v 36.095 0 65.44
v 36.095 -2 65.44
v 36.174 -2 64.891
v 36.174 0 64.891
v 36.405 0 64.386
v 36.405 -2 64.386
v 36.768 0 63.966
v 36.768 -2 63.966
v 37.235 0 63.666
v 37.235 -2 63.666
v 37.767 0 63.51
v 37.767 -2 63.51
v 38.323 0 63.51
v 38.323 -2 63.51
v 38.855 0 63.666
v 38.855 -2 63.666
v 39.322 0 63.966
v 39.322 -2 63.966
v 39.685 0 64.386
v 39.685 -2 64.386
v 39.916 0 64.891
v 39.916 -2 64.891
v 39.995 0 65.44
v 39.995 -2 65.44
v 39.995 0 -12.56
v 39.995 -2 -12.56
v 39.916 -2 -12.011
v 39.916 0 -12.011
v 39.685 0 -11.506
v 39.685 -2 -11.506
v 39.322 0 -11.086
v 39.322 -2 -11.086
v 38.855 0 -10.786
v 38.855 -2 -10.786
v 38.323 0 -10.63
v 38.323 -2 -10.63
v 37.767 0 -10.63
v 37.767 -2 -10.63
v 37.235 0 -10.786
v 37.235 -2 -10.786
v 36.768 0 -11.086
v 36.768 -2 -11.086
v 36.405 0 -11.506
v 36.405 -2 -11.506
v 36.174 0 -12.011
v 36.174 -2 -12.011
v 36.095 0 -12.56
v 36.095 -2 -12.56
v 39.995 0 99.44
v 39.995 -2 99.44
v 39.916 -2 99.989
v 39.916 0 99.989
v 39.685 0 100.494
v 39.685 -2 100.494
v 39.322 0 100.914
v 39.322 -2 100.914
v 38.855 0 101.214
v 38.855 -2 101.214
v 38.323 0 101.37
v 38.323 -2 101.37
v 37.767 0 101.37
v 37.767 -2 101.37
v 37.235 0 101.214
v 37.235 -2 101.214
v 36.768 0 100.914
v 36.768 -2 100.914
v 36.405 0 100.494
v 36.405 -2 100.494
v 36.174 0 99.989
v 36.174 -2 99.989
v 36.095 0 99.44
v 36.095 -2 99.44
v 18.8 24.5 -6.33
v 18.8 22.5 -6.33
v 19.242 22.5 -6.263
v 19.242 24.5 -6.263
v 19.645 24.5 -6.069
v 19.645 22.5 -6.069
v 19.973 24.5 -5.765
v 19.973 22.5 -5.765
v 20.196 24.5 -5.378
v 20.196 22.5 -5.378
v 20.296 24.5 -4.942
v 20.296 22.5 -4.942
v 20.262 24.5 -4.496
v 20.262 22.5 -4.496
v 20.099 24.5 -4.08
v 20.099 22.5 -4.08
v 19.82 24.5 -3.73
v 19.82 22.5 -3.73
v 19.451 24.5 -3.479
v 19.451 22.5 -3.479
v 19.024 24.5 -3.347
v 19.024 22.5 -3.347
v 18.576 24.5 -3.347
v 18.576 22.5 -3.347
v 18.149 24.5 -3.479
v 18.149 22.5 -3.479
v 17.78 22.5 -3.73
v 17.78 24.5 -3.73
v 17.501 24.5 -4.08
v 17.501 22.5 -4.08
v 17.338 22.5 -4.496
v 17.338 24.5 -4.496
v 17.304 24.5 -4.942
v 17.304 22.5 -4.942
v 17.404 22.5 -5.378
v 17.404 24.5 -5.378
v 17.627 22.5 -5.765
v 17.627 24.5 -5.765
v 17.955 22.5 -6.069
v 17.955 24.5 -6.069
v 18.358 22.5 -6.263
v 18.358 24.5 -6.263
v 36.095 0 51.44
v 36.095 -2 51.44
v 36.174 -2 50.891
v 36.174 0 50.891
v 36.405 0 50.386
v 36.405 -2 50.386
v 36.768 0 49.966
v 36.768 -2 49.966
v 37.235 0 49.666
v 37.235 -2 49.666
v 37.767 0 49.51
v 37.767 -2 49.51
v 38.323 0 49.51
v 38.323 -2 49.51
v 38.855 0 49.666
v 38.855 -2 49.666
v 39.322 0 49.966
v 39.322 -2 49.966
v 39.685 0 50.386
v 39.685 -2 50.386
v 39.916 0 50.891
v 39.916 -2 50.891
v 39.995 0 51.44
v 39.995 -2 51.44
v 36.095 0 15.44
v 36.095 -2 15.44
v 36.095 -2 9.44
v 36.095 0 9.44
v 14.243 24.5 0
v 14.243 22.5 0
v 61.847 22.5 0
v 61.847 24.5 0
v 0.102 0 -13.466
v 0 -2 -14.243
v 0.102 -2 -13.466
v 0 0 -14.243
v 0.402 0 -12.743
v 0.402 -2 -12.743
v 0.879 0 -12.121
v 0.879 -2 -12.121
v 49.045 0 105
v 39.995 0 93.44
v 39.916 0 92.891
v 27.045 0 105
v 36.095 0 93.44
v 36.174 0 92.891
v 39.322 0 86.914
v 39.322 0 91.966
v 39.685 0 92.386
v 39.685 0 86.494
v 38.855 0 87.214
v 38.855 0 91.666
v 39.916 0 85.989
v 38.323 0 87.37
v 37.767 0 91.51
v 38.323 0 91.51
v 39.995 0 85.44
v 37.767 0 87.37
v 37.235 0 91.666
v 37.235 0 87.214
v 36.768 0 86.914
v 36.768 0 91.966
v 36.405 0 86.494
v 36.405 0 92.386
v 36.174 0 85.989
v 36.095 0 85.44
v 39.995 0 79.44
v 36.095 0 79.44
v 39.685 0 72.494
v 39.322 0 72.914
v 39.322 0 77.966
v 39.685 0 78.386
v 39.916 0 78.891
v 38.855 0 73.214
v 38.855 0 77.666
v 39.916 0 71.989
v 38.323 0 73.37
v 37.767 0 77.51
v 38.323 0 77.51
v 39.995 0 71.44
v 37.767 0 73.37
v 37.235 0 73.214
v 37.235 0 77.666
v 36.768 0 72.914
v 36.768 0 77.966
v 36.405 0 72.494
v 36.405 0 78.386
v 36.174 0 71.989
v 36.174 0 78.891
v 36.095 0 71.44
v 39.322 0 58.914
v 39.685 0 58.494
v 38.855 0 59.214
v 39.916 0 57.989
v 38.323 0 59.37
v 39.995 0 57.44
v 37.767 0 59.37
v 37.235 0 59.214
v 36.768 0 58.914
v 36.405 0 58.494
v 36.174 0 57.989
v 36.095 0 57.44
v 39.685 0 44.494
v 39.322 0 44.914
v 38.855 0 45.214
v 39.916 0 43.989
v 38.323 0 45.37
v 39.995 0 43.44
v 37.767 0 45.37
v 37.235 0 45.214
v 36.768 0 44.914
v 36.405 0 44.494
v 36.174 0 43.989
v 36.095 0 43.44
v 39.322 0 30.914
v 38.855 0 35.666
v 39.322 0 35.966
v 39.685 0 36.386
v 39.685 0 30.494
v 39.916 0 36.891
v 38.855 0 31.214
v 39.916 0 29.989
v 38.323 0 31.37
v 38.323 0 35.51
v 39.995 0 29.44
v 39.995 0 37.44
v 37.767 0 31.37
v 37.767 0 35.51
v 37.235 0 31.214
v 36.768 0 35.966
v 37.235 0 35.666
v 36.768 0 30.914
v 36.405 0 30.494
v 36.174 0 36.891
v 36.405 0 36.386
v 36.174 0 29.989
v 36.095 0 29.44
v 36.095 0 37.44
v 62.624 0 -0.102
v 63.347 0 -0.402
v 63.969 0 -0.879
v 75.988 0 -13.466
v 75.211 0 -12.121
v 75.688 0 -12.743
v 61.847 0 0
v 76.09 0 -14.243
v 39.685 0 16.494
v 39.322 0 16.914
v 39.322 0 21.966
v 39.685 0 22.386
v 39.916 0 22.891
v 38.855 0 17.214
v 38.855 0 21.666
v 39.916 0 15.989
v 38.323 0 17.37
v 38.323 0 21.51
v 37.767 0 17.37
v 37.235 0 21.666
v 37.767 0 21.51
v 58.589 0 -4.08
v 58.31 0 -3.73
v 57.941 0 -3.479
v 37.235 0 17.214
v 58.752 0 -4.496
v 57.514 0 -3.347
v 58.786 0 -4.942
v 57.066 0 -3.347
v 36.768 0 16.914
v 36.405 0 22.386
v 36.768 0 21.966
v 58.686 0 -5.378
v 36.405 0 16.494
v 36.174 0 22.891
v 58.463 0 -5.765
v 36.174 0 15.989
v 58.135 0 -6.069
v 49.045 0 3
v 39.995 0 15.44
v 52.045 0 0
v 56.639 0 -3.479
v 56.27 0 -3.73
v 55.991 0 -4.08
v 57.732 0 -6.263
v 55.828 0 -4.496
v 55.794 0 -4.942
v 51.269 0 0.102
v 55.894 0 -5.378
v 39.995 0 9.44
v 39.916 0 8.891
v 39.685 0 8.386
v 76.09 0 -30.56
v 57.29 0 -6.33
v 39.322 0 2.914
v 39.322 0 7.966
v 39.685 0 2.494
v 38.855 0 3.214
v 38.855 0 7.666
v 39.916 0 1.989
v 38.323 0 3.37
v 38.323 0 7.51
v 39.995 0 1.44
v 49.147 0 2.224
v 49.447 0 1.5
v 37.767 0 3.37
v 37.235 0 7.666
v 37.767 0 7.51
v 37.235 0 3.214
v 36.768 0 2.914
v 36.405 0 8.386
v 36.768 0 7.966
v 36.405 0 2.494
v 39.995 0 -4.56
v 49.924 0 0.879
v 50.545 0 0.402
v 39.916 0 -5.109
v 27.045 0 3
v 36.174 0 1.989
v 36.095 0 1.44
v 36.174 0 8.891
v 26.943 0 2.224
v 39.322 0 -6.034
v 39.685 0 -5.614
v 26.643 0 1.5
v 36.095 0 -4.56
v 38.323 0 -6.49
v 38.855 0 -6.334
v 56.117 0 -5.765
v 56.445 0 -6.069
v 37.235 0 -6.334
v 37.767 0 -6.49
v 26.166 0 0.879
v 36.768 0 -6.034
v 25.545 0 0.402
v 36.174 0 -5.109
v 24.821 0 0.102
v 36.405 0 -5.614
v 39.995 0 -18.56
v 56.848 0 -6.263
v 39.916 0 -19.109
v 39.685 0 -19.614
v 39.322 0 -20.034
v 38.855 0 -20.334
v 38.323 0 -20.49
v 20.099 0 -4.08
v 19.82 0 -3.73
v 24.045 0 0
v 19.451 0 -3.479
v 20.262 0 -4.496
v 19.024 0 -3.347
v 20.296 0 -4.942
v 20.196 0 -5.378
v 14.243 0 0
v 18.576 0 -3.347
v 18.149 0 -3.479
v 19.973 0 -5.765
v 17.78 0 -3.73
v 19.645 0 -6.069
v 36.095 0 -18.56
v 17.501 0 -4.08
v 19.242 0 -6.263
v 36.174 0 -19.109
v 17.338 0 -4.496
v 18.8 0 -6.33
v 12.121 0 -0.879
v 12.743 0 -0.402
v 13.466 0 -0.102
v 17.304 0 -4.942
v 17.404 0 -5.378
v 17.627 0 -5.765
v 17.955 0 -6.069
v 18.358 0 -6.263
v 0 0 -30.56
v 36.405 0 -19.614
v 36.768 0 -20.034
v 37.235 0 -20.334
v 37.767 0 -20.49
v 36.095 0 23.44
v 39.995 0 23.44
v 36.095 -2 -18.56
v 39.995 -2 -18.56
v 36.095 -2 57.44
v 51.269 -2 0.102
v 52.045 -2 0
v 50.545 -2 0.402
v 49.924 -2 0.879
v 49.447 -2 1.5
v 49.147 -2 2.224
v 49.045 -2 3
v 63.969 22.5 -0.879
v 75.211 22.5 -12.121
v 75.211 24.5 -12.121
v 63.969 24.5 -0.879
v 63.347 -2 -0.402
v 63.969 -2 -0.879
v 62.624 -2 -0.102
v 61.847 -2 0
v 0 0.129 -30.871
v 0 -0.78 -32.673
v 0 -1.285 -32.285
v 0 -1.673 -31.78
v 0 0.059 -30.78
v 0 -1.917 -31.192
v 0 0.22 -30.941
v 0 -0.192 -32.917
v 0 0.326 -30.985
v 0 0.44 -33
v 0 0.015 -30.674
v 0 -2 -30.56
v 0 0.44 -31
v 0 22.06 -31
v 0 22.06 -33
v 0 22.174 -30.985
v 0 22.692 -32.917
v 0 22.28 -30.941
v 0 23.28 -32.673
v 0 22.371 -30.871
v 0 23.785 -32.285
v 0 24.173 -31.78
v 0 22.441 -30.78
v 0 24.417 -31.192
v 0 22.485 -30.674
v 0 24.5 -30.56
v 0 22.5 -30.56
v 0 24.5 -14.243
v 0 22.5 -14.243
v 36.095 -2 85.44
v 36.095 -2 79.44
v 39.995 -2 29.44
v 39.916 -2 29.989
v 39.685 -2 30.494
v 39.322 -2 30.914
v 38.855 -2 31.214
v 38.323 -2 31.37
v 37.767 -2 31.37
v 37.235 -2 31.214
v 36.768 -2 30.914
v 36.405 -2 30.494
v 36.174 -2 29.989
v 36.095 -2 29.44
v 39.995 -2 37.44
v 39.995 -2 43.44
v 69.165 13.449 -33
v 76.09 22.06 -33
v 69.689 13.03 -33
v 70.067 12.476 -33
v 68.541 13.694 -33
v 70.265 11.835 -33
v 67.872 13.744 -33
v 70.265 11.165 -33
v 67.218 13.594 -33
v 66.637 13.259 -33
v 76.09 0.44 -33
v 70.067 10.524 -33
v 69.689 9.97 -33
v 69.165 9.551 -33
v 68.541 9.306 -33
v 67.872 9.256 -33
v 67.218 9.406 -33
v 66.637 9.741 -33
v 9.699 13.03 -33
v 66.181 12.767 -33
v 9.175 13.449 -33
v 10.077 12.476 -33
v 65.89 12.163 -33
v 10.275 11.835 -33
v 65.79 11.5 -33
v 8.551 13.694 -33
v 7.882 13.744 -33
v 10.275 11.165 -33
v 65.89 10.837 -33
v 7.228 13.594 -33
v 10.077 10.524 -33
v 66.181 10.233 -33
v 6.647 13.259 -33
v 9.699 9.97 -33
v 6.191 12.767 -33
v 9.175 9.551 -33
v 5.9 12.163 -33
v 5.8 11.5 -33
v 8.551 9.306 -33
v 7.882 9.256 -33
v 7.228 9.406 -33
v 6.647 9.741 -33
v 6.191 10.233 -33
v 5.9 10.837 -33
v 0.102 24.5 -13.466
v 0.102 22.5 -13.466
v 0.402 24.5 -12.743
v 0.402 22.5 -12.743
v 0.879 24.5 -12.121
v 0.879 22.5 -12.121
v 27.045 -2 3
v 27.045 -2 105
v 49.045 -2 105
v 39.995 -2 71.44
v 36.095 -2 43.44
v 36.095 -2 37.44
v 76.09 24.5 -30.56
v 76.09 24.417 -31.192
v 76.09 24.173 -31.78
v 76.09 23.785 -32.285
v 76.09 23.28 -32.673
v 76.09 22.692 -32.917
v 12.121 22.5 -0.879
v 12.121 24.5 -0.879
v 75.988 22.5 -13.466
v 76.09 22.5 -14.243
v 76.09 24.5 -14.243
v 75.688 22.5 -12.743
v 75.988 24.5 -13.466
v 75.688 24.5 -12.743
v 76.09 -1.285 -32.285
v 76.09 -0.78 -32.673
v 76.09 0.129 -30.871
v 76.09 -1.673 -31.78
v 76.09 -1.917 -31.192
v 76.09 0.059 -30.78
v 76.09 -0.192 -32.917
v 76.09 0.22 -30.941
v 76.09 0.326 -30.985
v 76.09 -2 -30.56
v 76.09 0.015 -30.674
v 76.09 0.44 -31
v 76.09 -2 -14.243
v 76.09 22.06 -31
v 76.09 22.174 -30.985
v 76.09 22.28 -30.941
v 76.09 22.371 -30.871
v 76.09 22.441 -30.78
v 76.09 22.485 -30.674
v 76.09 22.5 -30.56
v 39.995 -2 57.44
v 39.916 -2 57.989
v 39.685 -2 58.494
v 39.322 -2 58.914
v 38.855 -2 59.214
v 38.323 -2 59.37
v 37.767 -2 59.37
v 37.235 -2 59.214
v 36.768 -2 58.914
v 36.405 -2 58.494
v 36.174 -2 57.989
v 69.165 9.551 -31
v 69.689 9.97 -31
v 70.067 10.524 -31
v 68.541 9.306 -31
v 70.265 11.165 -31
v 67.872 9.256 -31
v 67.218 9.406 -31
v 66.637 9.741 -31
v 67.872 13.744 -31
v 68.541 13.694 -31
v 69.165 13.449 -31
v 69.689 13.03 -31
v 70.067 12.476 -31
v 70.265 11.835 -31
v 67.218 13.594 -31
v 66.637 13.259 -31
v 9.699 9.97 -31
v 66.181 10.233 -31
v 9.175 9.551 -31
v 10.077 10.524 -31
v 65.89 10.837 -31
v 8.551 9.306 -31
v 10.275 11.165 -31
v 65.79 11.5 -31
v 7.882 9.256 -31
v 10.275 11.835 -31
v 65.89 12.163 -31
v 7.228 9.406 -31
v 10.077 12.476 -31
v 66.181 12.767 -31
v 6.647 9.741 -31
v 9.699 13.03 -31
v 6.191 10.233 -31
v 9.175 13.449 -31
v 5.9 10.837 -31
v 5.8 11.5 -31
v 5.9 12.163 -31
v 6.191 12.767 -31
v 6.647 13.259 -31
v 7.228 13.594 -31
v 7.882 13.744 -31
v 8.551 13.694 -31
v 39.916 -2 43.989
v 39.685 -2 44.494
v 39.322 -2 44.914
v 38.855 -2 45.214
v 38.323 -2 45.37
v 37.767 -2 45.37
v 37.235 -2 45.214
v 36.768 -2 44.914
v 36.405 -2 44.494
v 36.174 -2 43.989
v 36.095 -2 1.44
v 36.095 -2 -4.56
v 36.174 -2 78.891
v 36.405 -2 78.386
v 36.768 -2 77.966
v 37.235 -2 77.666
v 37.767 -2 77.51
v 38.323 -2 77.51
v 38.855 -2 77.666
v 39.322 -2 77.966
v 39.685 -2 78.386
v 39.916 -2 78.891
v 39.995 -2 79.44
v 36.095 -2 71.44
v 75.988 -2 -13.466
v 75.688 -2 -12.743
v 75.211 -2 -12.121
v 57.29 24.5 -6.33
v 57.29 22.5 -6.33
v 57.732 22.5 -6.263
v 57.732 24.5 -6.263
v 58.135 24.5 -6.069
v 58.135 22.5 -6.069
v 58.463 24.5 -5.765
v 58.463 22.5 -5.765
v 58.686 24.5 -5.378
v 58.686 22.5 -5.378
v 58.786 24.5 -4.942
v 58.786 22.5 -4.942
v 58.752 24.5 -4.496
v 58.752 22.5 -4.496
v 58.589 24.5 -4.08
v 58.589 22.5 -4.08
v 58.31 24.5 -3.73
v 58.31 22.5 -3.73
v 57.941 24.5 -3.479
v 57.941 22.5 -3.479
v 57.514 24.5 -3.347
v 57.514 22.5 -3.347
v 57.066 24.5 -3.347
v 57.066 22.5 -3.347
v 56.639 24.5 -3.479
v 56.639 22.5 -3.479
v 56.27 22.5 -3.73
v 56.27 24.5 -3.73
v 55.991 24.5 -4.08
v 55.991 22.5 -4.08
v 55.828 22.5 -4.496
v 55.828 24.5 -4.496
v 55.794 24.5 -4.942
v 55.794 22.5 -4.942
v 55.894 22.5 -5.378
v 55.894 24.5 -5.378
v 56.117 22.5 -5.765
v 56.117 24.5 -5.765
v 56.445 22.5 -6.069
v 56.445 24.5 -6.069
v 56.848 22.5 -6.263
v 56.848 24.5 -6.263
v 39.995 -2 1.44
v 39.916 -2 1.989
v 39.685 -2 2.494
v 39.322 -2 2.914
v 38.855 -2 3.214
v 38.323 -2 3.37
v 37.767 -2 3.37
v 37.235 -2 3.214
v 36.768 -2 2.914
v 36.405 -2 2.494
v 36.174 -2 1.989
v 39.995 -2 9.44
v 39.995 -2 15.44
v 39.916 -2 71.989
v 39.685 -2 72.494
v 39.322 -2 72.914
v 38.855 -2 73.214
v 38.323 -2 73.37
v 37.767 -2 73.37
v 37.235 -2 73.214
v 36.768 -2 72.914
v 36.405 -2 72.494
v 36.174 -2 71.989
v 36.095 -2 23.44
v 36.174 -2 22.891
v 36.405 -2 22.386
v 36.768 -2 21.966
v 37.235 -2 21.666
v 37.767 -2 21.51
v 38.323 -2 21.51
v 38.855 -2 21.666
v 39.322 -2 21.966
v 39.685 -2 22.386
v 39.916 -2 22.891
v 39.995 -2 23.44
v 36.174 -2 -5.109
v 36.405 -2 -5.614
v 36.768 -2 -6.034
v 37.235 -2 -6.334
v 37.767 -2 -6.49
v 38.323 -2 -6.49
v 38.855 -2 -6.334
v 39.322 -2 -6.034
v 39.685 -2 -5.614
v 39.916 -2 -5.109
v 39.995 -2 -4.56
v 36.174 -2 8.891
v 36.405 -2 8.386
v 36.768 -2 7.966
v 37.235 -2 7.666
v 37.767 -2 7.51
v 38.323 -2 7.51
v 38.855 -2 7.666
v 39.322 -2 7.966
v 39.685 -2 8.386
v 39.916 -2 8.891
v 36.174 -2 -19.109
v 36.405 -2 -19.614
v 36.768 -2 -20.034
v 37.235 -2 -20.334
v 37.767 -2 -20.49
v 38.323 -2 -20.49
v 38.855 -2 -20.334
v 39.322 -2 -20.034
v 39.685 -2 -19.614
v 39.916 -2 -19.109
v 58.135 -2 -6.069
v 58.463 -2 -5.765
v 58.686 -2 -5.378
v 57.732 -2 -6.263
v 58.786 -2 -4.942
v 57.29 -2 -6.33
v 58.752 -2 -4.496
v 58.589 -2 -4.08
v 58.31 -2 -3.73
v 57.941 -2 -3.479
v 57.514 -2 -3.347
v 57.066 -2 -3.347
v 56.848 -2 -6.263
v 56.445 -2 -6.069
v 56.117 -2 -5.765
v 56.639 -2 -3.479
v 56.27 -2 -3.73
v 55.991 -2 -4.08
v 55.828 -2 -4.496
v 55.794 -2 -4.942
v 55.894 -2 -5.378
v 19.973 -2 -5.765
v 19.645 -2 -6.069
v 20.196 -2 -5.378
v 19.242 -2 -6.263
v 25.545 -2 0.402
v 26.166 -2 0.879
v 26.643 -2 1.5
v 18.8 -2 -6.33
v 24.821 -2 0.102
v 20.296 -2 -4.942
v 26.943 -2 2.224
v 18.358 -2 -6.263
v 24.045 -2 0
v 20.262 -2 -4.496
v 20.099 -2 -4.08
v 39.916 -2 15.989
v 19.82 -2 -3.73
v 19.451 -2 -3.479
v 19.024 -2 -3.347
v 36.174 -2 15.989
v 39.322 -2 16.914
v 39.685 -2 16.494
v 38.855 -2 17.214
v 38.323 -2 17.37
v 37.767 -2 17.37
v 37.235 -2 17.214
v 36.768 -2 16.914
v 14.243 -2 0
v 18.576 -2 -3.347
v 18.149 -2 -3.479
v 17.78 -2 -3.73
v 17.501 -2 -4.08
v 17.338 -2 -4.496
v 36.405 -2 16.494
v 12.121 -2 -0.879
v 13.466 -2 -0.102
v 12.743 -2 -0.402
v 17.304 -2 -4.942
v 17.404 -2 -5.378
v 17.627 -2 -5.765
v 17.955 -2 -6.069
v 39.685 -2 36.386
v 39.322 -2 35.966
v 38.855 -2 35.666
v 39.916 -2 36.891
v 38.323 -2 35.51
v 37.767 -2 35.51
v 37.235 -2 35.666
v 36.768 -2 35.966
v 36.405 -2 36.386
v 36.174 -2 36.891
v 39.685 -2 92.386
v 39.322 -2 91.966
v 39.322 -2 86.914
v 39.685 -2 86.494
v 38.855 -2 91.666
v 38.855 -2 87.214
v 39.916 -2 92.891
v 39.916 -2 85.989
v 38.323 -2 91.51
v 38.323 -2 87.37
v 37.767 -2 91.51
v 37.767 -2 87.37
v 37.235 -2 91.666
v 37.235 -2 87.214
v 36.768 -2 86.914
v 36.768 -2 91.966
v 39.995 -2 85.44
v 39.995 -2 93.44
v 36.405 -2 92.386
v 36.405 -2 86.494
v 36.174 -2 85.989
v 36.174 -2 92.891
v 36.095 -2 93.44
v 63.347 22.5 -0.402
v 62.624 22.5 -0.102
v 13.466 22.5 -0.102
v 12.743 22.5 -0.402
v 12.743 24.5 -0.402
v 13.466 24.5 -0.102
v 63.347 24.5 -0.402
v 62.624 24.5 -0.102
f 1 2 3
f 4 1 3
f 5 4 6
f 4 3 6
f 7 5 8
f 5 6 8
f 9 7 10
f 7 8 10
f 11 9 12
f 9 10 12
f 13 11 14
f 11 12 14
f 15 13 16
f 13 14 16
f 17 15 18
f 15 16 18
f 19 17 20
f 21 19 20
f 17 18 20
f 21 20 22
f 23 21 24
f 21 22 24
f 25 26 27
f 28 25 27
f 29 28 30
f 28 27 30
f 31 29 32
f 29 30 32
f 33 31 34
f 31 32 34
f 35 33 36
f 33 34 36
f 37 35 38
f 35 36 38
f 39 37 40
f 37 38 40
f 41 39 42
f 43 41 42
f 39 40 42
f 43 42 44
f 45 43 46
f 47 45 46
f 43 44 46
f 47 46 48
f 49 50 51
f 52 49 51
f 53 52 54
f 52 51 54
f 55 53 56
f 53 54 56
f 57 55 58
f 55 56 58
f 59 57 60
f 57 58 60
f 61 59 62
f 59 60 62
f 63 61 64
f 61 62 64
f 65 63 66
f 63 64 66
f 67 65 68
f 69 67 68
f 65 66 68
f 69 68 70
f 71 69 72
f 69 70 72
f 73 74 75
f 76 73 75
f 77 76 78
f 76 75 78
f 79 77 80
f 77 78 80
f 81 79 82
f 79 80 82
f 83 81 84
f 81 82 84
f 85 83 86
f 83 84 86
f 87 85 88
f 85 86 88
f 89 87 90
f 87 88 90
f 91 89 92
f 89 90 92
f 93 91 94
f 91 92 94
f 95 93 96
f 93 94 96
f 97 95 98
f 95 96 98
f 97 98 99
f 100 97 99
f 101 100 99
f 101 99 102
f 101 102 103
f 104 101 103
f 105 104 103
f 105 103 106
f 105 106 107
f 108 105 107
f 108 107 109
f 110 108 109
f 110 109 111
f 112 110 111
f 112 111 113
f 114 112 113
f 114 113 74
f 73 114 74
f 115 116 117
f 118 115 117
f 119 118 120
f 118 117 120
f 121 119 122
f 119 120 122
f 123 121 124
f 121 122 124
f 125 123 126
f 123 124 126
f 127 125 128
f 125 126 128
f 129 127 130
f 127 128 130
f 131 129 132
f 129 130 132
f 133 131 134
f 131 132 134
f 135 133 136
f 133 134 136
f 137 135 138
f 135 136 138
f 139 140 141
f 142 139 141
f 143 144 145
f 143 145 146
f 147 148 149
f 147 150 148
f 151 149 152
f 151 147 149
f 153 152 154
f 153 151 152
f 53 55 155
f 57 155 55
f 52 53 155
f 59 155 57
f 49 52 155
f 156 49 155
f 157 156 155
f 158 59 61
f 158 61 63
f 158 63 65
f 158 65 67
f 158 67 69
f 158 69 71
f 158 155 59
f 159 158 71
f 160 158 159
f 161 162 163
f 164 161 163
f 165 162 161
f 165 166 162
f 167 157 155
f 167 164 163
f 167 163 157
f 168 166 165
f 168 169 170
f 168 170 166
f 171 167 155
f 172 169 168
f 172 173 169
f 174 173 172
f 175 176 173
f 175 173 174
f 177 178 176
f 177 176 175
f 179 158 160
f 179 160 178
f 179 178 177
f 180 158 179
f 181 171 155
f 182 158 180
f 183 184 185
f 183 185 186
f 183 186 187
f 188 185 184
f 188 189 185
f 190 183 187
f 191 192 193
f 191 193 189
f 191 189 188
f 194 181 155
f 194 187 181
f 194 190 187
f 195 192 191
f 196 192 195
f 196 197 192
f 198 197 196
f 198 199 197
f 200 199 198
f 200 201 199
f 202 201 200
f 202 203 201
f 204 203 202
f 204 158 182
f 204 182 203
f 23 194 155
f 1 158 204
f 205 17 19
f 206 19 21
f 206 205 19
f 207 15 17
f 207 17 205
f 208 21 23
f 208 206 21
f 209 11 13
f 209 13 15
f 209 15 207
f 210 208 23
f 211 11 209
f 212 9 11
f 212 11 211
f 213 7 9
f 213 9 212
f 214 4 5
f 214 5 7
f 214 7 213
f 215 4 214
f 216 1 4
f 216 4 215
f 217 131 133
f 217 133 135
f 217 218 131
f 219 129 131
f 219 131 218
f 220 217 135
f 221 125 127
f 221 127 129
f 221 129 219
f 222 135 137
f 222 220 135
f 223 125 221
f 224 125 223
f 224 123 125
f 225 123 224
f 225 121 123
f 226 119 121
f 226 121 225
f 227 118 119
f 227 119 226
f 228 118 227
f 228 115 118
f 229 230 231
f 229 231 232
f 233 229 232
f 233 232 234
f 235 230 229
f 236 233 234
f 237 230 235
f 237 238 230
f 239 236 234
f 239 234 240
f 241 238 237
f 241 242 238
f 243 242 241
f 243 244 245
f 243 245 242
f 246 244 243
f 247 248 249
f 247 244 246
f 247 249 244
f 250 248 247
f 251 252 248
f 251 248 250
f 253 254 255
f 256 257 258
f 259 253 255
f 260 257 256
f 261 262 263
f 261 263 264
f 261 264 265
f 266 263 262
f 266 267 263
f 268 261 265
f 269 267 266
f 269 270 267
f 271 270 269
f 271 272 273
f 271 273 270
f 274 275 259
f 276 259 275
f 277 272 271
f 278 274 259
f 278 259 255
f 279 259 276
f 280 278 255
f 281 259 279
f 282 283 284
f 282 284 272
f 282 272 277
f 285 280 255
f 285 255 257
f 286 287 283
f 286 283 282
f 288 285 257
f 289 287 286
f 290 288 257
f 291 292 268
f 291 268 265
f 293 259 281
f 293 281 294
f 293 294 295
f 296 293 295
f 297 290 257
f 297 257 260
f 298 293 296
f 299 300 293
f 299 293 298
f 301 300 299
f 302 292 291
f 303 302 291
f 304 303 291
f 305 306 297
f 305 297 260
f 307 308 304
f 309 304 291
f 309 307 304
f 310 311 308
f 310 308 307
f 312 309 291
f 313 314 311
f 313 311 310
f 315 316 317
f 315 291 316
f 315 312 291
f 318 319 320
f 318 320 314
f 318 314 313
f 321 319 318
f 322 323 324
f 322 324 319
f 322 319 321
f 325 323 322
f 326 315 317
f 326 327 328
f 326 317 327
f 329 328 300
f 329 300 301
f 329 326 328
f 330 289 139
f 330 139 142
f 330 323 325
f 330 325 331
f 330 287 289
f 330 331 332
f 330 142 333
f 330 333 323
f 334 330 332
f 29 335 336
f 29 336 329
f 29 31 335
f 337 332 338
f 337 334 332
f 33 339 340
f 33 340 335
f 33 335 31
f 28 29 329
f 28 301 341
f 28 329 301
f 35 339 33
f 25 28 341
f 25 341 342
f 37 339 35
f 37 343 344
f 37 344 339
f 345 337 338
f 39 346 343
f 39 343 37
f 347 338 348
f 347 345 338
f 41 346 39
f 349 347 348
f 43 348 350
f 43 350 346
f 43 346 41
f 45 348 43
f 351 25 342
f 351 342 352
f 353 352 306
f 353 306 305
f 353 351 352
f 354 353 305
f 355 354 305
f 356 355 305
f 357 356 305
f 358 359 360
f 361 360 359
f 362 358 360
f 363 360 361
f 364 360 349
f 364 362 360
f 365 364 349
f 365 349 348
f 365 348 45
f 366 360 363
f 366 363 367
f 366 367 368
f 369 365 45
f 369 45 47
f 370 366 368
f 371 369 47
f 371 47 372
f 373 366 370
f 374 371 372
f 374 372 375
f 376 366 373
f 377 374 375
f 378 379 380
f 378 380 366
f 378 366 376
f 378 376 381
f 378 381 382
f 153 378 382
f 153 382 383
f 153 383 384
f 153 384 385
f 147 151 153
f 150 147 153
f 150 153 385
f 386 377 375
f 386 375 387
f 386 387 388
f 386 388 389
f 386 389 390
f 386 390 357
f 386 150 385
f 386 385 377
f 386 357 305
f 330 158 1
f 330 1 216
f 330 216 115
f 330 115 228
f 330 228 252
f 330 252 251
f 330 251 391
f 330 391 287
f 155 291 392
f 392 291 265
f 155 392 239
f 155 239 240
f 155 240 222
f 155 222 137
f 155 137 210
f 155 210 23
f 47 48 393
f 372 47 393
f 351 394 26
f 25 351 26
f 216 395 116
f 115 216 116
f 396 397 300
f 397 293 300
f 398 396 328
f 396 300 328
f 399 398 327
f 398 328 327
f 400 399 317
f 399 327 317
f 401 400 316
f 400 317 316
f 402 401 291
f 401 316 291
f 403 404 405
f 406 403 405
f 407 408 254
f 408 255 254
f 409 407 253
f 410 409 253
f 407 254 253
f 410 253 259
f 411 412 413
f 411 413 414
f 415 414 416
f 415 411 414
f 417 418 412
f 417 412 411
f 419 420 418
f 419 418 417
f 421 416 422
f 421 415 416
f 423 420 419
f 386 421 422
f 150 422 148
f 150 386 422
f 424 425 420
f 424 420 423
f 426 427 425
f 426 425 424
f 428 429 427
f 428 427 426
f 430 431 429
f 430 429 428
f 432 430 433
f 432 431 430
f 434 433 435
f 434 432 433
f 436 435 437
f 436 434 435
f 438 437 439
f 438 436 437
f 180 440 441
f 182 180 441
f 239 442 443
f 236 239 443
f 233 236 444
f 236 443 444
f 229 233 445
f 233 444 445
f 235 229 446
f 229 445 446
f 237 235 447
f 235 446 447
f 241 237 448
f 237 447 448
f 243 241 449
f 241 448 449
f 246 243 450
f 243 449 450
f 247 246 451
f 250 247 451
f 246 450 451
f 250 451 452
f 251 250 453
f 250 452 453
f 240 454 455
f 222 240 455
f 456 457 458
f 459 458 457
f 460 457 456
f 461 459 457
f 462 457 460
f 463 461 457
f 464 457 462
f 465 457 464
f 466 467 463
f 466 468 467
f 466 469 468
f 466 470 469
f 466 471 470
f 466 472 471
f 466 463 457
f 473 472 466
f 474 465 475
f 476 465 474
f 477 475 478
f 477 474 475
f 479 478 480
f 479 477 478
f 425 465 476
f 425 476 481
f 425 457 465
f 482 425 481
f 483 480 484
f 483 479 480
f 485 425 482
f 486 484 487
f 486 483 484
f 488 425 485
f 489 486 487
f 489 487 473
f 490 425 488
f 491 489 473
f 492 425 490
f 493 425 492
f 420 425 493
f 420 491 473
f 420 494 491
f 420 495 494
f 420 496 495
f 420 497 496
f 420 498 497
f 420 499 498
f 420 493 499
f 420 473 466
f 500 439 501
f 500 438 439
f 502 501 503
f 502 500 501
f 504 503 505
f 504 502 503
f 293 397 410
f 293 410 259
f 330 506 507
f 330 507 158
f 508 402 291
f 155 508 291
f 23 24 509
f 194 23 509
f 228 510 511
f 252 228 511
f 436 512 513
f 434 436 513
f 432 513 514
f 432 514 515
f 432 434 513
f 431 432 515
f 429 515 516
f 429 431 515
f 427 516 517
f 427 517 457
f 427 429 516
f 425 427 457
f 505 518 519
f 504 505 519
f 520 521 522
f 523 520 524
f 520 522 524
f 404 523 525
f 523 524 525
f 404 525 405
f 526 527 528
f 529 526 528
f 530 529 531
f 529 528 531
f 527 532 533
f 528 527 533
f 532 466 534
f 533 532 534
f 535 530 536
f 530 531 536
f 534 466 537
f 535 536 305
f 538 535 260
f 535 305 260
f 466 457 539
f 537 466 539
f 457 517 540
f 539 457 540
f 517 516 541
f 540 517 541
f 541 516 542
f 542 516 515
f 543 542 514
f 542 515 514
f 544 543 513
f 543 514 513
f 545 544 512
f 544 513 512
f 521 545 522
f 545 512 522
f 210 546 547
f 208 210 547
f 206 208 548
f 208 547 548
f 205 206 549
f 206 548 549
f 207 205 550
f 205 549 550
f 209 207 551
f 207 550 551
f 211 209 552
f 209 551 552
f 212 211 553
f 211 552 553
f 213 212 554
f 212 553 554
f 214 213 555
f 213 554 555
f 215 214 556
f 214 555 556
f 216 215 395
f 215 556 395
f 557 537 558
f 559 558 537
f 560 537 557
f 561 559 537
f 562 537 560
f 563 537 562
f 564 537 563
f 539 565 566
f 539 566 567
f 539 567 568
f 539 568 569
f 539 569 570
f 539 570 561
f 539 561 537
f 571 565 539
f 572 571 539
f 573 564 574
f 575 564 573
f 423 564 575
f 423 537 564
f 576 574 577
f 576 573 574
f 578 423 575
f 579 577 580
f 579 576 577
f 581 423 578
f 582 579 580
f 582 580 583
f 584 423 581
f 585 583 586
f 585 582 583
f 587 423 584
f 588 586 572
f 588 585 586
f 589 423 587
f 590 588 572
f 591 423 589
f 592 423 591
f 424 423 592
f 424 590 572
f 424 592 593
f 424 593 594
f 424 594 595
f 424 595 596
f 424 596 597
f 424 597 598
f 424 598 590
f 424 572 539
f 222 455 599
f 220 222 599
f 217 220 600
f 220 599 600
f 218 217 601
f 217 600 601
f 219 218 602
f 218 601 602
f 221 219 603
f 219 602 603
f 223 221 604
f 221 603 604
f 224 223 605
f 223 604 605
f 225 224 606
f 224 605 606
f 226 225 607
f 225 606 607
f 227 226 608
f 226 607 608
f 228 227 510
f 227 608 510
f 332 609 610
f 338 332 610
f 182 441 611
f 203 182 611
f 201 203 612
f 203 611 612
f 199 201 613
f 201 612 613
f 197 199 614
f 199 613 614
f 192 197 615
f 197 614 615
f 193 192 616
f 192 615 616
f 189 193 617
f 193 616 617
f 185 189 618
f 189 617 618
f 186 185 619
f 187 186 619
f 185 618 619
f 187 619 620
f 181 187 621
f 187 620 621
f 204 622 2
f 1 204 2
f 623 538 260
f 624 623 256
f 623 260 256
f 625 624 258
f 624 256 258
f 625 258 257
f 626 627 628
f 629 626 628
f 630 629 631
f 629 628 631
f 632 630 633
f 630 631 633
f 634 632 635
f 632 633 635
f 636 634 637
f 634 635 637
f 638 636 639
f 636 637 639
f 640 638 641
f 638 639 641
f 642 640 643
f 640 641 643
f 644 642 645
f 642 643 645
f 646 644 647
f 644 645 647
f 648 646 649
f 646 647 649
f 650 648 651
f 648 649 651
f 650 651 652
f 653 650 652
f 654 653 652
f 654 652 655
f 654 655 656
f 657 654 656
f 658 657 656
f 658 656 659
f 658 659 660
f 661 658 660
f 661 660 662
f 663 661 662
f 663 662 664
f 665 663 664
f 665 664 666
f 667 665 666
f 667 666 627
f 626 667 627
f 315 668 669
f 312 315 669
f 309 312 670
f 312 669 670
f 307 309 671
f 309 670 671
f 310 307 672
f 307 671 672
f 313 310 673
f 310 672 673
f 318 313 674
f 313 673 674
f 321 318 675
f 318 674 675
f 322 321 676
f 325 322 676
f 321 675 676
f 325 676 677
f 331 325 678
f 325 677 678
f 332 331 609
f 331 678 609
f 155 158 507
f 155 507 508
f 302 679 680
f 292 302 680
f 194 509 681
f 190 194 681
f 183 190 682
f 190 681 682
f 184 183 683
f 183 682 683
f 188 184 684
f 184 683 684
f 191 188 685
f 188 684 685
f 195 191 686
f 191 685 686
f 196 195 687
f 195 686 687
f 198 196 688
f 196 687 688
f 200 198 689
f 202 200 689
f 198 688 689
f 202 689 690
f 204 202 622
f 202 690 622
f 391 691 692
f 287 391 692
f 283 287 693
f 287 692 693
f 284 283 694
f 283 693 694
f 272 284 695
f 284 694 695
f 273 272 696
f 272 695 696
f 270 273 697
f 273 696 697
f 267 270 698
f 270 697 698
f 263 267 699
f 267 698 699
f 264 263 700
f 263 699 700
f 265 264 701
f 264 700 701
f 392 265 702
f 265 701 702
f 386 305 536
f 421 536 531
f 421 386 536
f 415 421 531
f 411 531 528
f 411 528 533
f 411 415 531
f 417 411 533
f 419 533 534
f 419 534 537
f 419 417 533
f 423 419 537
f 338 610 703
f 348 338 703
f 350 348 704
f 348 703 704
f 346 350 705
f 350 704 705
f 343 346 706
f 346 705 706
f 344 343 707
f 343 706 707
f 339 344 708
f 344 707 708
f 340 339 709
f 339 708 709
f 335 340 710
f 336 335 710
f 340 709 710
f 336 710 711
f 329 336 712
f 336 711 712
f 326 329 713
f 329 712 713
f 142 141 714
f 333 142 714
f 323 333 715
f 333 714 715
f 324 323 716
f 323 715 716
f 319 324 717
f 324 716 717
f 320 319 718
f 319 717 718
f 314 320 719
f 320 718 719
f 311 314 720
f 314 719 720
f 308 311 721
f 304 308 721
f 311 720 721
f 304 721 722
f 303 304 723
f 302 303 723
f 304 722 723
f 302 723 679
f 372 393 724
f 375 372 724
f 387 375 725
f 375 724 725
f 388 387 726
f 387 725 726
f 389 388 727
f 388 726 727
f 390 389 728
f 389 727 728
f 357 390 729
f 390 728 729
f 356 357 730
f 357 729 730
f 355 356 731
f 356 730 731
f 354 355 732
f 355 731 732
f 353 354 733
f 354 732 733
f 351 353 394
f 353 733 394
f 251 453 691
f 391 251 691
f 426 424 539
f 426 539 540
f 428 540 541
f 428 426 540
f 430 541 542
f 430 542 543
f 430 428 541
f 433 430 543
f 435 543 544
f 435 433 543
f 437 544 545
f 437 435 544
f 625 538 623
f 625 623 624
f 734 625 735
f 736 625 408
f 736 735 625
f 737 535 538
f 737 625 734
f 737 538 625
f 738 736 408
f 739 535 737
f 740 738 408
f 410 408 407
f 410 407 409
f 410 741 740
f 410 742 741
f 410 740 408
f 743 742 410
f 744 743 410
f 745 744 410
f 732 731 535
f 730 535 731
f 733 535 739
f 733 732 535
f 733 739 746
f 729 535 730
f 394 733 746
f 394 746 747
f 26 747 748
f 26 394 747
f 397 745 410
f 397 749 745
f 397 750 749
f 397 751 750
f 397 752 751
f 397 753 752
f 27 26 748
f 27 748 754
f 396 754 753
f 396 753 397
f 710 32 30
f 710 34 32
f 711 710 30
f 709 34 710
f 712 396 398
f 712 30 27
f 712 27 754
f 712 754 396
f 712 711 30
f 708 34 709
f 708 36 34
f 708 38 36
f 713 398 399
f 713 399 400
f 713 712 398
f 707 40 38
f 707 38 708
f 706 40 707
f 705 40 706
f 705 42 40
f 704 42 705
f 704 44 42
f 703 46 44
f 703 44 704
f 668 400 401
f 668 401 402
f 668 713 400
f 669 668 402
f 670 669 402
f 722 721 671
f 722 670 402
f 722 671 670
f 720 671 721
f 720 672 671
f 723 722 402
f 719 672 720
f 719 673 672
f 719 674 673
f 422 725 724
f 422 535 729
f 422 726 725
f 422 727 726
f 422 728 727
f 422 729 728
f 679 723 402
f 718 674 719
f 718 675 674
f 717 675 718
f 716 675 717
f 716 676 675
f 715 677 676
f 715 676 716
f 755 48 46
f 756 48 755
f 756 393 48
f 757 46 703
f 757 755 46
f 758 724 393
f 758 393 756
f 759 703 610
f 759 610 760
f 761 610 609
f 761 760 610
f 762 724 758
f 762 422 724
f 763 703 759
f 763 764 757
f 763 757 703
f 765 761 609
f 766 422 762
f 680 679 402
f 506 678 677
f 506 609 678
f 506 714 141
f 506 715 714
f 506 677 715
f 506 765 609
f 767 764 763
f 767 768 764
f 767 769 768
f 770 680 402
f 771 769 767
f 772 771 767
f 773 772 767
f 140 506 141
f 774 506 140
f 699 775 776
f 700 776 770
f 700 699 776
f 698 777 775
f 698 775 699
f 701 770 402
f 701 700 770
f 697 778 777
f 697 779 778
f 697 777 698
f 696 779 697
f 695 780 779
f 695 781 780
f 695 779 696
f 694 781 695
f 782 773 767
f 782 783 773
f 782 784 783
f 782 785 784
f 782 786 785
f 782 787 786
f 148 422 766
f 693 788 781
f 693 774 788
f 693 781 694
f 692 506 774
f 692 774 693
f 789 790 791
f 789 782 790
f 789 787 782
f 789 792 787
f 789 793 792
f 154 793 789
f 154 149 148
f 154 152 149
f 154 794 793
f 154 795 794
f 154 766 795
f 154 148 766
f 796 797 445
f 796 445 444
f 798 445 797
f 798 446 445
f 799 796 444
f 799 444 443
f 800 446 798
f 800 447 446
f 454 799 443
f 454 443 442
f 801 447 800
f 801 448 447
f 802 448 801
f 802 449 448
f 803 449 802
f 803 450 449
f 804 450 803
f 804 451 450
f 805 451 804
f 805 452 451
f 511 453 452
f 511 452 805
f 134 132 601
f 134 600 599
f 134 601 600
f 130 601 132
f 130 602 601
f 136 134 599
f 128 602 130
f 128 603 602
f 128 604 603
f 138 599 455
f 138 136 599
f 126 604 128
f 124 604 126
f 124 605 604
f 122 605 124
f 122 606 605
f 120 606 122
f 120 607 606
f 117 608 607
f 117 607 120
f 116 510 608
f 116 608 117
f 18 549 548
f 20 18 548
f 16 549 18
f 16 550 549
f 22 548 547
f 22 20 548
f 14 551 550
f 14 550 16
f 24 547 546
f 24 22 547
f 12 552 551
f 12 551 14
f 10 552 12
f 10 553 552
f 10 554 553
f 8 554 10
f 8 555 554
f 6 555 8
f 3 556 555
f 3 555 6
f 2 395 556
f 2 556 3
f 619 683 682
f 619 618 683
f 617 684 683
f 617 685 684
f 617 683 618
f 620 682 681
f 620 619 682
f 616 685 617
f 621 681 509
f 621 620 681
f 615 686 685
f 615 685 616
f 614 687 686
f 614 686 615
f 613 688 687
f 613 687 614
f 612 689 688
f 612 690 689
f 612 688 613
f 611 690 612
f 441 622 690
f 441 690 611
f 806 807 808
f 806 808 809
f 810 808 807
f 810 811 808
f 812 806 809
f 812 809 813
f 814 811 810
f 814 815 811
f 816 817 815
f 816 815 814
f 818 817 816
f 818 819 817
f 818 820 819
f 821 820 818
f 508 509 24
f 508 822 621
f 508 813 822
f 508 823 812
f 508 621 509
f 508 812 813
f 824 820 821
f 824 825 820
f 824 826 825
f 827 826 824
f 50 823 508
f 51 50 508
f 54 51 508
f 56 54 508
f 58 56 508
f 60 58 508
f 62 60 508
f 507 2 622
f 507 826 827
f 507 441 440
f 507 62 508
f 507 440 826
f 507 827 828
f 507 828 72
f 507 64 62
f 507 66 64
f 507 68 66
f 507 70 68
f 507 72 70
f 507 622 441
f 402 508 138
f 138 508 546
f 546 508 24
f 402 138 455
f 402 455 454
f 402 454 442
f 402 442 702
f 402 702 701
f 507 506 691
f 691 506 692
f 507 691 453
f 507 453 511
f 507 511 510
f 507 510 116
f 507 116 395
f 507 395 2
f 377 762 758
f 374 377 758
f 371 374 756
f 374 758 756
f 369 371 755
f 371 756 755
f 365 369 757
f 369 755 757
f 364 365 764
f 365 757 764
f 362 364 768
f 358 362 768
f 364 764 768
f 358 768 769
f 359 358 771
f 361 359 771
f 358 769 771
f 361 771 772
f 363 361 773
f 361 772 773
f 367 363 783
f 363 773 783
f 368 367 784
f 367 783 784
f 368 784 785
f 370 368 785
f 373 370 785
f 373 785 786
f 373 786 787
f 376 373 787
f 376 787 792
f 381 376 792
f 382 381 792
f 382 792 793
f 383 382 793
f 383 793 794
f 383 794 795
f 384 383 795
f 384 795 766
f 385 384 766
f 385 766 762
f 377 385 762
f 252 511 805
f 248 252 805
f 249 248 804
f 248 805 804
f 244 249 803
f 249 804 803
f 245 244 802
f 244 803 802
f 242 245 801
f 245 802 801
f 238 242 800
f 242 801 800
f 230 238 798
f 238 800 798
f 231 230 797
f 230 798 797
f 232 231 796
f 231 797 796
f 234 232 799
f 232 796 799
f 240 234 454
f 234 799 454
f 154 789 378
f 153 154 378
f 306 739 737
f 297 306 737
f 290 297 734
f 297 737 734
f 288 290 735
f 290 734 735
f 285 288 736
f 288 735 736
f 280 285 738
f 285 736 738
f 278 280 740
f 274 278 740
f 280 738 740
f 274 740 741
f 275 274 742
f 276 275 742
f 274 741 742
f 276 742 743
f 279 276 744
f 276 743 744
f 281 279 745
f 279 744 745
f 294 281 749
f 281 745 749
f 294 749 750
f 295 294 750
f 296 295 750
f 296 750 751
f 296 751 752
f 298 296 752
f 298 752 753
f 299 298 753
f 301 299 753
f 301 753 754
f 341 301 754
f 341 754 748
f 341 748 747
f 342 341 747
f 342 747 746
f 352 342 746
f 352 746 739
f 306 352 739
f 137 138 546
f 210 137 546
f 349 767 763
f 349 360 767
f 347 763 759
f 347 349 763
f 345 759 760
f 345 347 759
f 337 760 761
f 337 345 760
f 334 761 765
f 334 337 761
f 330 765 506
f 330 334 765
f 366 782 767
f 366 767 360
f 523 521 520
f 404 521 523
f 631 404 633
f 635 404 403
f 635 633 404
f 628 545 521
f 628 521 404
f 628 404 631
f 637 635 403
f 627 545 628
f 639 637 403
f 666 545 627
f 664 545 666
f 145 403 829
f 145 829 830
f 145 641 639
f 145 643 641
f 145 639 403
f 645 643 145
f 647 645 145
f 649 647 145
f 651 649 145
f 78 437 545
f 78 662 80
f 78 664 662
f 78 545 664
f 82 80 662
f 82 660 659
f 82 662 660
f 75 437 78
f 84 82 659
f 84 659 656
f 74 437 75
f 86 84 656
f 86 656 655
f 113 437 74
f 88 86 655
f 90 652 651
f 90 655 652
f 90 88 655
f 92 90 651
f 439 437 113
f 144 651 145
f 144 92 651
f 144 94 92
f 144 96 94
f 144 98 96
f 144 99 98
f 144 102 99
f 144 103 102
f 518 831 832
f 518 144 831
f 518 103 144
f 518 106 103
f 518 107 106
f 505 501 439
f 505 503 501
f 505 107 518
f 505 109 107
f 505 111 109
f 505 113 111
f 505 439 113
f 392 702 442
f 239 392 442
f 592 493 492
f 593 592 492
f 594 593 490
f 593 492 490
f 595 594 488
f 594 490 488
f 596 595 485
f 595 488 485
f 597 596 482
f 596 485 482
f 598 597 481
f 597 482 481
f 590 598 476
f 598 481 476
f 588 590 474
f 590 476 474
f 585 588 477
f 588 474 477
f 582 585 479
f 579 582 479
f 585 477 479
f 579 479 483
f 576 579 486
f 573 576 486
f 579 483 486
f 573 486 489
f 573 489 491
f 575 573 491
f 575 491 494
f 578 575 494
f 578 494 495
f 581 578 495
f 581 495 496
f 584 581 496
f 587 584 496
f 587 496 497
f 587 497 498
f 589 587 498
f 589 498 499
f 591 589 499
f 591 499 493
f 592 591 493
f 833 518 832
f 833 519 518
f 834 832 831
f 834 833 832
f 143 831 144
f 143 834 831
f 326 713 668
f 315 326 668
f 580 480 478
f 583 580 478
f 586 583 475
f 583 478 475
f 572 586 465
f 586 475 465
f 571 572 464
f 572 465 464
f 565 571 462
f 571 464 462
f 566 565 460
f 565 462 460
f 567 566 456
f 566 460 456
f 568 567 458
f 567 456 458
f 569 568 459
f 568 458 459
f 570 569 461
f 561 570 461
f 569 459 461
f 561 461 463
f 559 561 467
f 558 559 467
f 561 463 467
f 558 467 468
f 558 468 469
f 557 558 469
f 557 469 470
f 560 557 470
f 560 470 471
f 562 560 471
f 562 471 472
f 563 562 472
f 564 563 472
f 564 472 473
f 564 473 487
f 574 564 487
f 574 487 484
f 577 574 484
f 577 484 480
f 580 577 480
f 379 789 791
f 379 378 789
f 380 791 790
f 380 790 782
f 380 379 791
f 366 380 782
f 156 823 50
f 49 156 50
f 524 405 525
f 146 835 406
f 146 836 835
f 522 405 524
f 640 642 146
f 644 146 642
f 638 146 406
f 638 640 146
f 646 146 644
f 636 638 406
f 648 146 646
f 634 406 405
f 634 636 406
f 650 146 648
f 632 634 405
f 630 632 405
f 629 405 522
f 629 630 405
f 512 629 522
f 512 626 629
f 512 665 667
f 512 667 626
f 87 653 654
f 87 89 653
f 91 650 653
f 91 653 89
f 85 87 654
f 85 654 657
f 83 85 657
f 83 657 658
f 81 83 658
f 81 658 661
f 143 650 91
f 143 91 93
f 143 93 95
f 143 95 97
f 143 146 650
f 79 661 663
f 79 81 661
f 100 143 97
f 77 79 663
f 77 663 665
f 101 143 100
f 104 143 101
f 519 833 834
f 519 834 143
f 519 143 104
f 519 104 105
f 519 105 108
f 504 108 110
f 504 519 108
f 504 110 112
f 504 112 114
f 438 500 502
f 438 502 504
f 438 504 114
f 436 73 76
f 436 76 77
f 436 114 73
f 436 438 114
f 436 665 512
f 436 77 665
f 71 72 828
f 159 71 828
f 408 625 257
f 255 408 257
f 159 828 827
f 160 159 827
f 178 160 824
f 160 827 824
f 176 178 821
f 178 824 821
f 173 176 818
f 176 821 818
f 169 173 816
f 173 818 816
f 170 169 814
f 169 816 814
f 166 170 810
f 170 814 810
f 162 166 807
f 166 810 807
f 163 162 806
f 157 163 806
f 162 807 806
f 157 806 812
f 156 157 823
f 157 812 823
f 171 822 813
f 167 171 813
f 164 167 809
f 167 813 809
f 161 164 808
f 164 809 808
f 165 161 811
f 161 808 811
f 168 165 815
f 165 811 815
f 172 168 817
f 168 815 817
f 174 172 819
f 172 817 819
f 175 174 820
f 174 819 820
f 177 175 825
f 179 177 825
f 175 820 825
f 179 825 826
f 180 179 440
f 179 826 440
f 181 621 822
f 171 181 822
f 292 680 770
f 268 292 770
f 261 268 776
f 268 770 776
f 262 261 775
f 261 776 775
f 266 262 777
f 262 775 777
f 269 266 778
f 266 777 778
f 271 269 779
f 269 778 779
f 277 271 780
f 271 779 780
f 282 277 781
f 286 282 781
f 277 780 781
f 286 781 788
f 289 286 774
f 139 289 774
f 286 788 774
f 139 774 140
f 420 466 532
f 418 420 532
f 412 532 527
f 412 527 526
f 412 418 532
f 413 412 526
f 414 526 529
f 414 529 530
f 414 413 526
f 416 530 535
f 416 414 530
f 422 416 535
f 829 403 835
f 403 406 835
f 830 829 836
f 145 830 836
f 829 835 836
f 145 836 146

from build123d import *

# Parameters (mm, degrees)
BASE_FLANGE1_DEPTH  = 76.09
SKETCH6_W           = 22
SKETCH6_H           = 2
BOSS_EXTRUDE1_DEPTH = 105
FILLET2_R           = 3
CHAMFER1_SIZE       = 13
CHAMFER2_SIZE       = 13
FILLET3_R           = 3
CUT_EXTRUDE1_REACH  = 134.352
CUT_EXTRUDE2_REACH  = 134.352
SKETCH7_3_R         = 1.5
CUT_EXTRUDE3_REACH  = 161.48
SKETCH8_R           = 2.25


# Sheet-metal steps are written as plain solids
with BuildPart() as part:
    # Sketch1 → Base-Flange1 (new body)
    with BuildSketch(Plane(origin=(0, 0, 0), x_dir=(0, 0, -1), z_dir=(1, 0, 0))):
        with BuildLine():
            Line((0, 0), (30.56, 0))
            ThreePointArc((30.56, 0), (30.871126984, 0.128873016), (31, 0.44))
            Line((31, 0.44), (31, 22.06))
            ThreePointArc((31, 22.06), (30.871126984, 22.371126984), (30.56, 22.5))
            Line((30.56, 22.5), (0, 22.5))
            Line((0, 22.5), (0, 24.5))
            Line((0, 24.5), (30.56, 24.5))
            ThreePointArc((30.56, 24.5), (32.285340546, 23.785340546), (33, 22.06))
            Line((33, 22.06), (33, 0.44))
            ThreePointArc((33, 0.44), (32.285340546, -1.285340546), (30.56, -2))
            Line((30.56, -2), (0, -2))
            Line((0, -2), (0, 0))
        make_face()
    extrude(amount=BASE_FLANGE1_DEPTH)

    # Sketch6 → Boss-Extrude1 (add)
    with BuildSketch(Plane.XY):
        with Locations((38.045, -1)):
            Rectangle(SKETCH6_W, SKETCH6_H)
    extrude(amount=BOSS_EXTRUDE1_DEPTH)

    # Fillet2
    fillet2_edges = [part.edges().sort_by_distance(p)[0] for p in [
        (49.045, -1, 0),
        (27.045, -1, 0),
    ]]
    fillet(fillet2_edges, radius=FILLET2_R)

    # Chamfer1
    chamfer1_edges = [part.edges().sort_by_distance(p)[0] for p in [
        (0, -1, 0),
        (0, 23.5, 0),
    ]]
    chamfer(chamfer1_edges, length=CHAMFER1_SIZE)

    # Chamfer2
    chamfer2_edges = [part.edges().sort_by_distance(p)[0] for p in [
        (76.09, -1, 0),
        (76.09, 23.5, 0),
    ]]
    chamfer(chamfer2_edges, length=CHAMFER2_SIZE)

    # Fillet3
    fillet3_edges = [part.edges().sort_by_distance(p)[0] for p in [
        (76.09, -1, -13),
        (76.09, 23.5, -13),
        (63.09, -1, 0),
        (63.09, 23.5, 0),
        (13, 23.5, 0),
        (13, -1, 0),
        (0, -1, -13),
        (0, 23.5, -13),
    ]]
    fillet(fillet3_edges, radius=FILLET3_R)

    # Sketch7 → Cut-Extrude1 (cut, up to next)
    with BuildSketch(Plane.XZ.offset(2), mode=Mode.PRIVATE) as cut_extrude1_sk1:
        with BuildLine():
            Line((39.995, -18.56), (39.995, -12.56))
            ThreePointArc((39.995, -12.56), (38.045, -10.61), (36.095, -12.56))
            Line((36.095, -12.56), (36.095, -18.56))
            ThreePointArc((36.095, -18.56), (38.045, -20.51), (39.995, -18.56))
        make_face()
    cut_extrude1_tool1 = extrude(cut_extrude1_sk1.sketch, amount=-CUT_EXTRUDE1_REACH, mode=Mode.PRIVATE) & part.part
    # Sketch7 → Cut-Extrude1 (cut, up to next)
    with BuildSketch(Plane.XZ.offset(2), mode=Mode.PRIVATE) as cut_extrude1_sk2:
        with BuildLine():
            Line((39.995, -4.56), (39.995, 1.44))
            ThreePointArc((39.995, 1.44), (38.045, 3.39), (36.095, 1.44))
            Line((36.095, 1.44), (36.095, -4.56))
            ThreePointArc((36.095, -4.56), (38.045, -6.51), (39.995, -4.56))
        make_face()
    cut_extrude1_tool2 = extrude(cut_extrude1_sk2.sketch, amount=-CUT_EXTRUDE1_REACH, mode=Mode.PRIVATE) & part.part
    # Sketch7 → Cut-Extrude1 (cut, up to next)
    with BuildSketch(Plane.XZ.offset(2), mode=Mode.PRIVATE) as cut_extrude1_sk3:
        with BuildLine():
            Line((39.995, 9.44), (39.995, 15.44))
            ThreePointArc((39.995, 15.44), (38.045, 17.39), (36.095, 15.44))
            Line((36.095, 15.44), (36.095, 9.44))
            ThreePointArc((36.095, 9.44), (38.045, 7.49), (39.995, 9.44))
        make_face()
    cut_extrude1_tool3 = extrude(cut_extrude1_sk3.sketch, amount=-CUT_EXTRUDE1_REACH, mode=Mode.PRIVATE) & part.part
    # Sketch7 → Cut-Extrude1 (cut, up to next)
    with BuildSketch(Plane.XZ.offset(2), mode=Mode.PRIVATE) as cut_extrude1_sk4:
        with BuildLine():
            Line((39.995, 23.44), (39.995, 29.44))
            ThreePointArc((39.995, 29.44), (38.045, 31.39), (36.095, 29.44))
            Line((36.095, 29.44), (36.095, 23.44))
            ThreePointArc((36.095, 23.44), (38.045, 21.49), (39.995, 23.44))
        make_face()
    cut_extrude1_tool4 = extrude(cut_extrude1_sk4.sketch, amount=-CUT_EXTRUDE1_REACH, mode=Mode.PRIVATE) & part.part
    # Sketch7 → Cut-Extrude1 (cut, up to next)
    with BuildSketch(Plane.XZ.offset(2), mode=Mode.PRIVATE) as cut_extrude1_sk5:
        with BuildLine():
            Line((39.995, 37.44), (39.995, 43.44))
            ThreePointArc((39.995, 43.44), (38.045, 45.39), (36.095, 43.44))
            Line((36.095, 43.44), (36.095, 37.44))
            ThreePointArc((36.095, 37.44), (38.045, 35.49), (39.995, 37.44))
        make_face()
    cut_extrude1_tool5 = extrude(cut_extrude1_sk5.sketch, amount=-CUT_EXTRUDE1_REACH, mode=Mode.PRIVATE) & part.part
    # Sketch7 → Cut-Extrude1 (cut, up to next)
    with BuildSketch(Plane.XZ.offset(2), mode=Mode.PRIVATE) as cut_extrude1_sk6:
        with BuildLine():
            Line((39.995, 51.44), (39.995, 57.44))
            ThreePointArc((39.995, 57.44), (38.045, 59.39), (36.095, 57.44))
            Line((36.095, 57.44), (36.095, 51.44))
            ThreePointArc((36.095, 51.44), (38.045, 49.49), (39.995, 51.44))
        make_face()
    cut_extrude1_tool6 = extrude(cut_extrude1_sk6.sketch, amount=-CUT_EXTRUDE1_REACH, mode=Mode.PRIVATE) & part.part
    # Sketch7 → Cut-Extrude1 (cut, up to next)
    with BuildSketch(Plane.XZ.offset(2), mode=Mode.PRIVATE) as cut_extrude1_sk7:
        with BuildLine():
            Line((39.995, 65.44), (39.995, 71.44))
            ThreePointArc((39.995, 71.44), (38.045, 73.39), (36.095, 71.44))
            Line((36.095, 71.44), (36.095, 65.44))
            ThreePointArc((36.095, 65.44), (38.045, 63.49), (39.995, 65.44))
        make_face()
    cut_extrude1_tool7 = extrude(cut_extrude1_sk7.sketch, amount=-CUT_EXTRUDE1_REACH, mode=Mode.PRIVATE) & part.part
    # Sketch7 → Cut-Extrude1 (cut, up to next)
    with BuildSketch(Plane.XZ.offset(2), mode=Mode.PRIVATE) as cut_extrude1_sk8:
        with BuildLine():
            Line((39.995, 79.44), (39.995, 85.44))
            ThreePointArc((39.995, 85.44), (38.045, 87.39), (36.095, 85.44))
            Line((36.095, 85.44), (36.095, 79.44))
            ThreePointArc((36.095, 79.44), (38.045, 77.49), (39.995, 79.44))
        make_face()
    cut_extrude1_tool8 = extrude(cut_extrude1_sk8.sketch, amount=-CUT_EXTRUDE1_REACH, mode=Mode.PRIVATE) & part.part
    # Sketch7 → Cut-Extrude1 (cut, up to next)
    with BuildSketch(Plane.XZ.offset(2), mode=Mode.PRIVATE) as cut_extrude1_sk9:
        with BuildLine():
            Line((39.995, 93.44), (39.995, 99.44))
            ThreePointArc((39.995, 99.44), (38.045, 101.39), (36.095, 99.44))
            Line((36.095, 99.44), (36.095, 93.44))
            ThreePointArc((36.095, 93.44), (38.045, 91.49), (39.995, 93.44))
        make_face()
    cut_extrude1_tool9 = extrude(cut_extrude1_sk9.sketch, amount=-CUT_EXTRUDE1_REACH, mode=Mode.PRIVATE) & part.part
    add(cut_extrude1_tool1.solids().sort_by_distance((38.045, -2, -15.56))[0], mode=Mode.SUBTRACT)
    add(cut_extrude1_tool2.solids().sort_by_distance((38.045, -2, -1.56))[0], mode=Mode.SUBTRACT)
    add(cut_extrude1_tool3.solids().sort_by_distance((38.045, -2, 12.44))[0], mode=Mode.SUBTRACT)
    add(cut_extrude1_tool4.solids().sort_by_distance((38.045, -2, 26.44))[0], mode=Mode.SUBTRACT)
    add(cut_extrude1_tool5.solids().sort_by_distance((38.045, -2, 40.44))[0], mode=Mode.SUBTRACT)
    add(cut_extrude1_tool6.solids().sort_by_distance((38.045, -2, 54.44))[0], mode=Mode.SUBTRACT)
    add(cut_extrude1_tool7.solids().sort_by_distance((38.045, -2, 68.44))[0], mode=Mode.SUBTRACT)
    add(cut_extrude1_tool8.solids().sort_by_distance((38.045, -2, 82.44))[0], mode=Mode.SUBTRACT)
    add(cut_extrude1_tool9.solids().sort_by_distance((38.045, -2, 96.44))[0], mode=Mode.SUBTRACT)

    # Cut-Extrude2: up to this face of the body (flat: up to its plane)
    cut_extrude2_end = Plane(part.part.faces().sort_by_distance((38.045, 24.5, -16.141358018))[0])
    # Sketch7<3> → Cut-Extrude2 (cut, up to the picked face)
    with BuildSketch(Plane.XZ.offset(2), mode=Mode.PRIVATE) as cut_extrude2_sk1:
        with Locations(Location((18.8, -4.83, 0), (0, 0, 270))):
            Circle(SKETCH7_3_R)
    cut_extrude2_tool1 = split(extrude(cut_extrude2_sk1.sketch, amount=-CUT_EXTRUDE2_REACH, mode=Mode.PRIVATE), bisect_by=cut_extrude2_end, keep=Keep.BOTH, mode=Mode.PRIVATE)
    # Sketch7<3> → Cut-Extrude2 (cut, up to the picked face)
    with BuildSketch(Plane.XZ.offset(2), mode=Mode.PRIVATE) as cut_extrude2_sk2:
        with Locations(Location((57.29, -4.83, 0), (0, 0, 270))):
            Circle(SKETCH7_3_R)
    cut_extrude2_tool2 = split(extrude(cut_extrude2_sk2.sketch, amount=-CUT_EXTRUDE2_REACH, mode=Mode.PRIVATE), bisect_by=cut_extrude2_end, keep=Keep.BOTH, mode=Mode.PRIVATE)
    add(cut_extrude2_tool1.solids().sort_by(Axis((18.8, -2, -4.83), (0, 1, 0)))[0], mode=Mode.SUBTRACT)
    add(cut_extrude2_tool2.solids().sort_by(Axis((57.29, -2, -4.83), (0, 1, 0)))[0], mode=Mode.SUBTRACT)

    # Sketch8 → Cut-Extrude3 (cut, up to next)
    with BuildSketch(Plane(origin=(0, 0, -33), x_dir=(-1, 0, 0), z_dir=(0, 0, -1)), mode=Mode.PRIVATE) as cut_extrude3_sk1:
        with Locations((-8.05, 11.5)):
            Circle(SKETCH8_R)
    cut_extrude3_tool1 = extrude(cut_extrude3_sk1.sketch, amount=-CUT_EXTRUDE3_REACH, mode=Mode.PRIVATE) & part.part
    # Sketch8 → Cut-Extrude3 (cut, up to next)
    with BuildSketch(Plane(origin=(0, 0, -33), x_dir=(-1, 0, 0), z_dir=(0, 0, -1)), mode=Mode.PRIVATE) as cut_extrude3_sk2:
        with Locations((-68.04, 11.5)):
            Circle(SKETCH8_R)
    cut_extrude3_tool2 = extrude(cut_extrude3_sk2.sketch, amount=-CUT_EXTRUDE3_REACH, mode=Mode.PRIVATE) & part.part
    add(cut_extrude3_tool1.solids().sort_by_distance((8.05, 11.5, -33))[0], mode=Mode.SUBTRACT)
    add(cut_extrude3_tool2.solids().sort_by_distance((68.04, 11.5, -33))[0], mode=Mode.SUBTRACT)


solid = part.part
